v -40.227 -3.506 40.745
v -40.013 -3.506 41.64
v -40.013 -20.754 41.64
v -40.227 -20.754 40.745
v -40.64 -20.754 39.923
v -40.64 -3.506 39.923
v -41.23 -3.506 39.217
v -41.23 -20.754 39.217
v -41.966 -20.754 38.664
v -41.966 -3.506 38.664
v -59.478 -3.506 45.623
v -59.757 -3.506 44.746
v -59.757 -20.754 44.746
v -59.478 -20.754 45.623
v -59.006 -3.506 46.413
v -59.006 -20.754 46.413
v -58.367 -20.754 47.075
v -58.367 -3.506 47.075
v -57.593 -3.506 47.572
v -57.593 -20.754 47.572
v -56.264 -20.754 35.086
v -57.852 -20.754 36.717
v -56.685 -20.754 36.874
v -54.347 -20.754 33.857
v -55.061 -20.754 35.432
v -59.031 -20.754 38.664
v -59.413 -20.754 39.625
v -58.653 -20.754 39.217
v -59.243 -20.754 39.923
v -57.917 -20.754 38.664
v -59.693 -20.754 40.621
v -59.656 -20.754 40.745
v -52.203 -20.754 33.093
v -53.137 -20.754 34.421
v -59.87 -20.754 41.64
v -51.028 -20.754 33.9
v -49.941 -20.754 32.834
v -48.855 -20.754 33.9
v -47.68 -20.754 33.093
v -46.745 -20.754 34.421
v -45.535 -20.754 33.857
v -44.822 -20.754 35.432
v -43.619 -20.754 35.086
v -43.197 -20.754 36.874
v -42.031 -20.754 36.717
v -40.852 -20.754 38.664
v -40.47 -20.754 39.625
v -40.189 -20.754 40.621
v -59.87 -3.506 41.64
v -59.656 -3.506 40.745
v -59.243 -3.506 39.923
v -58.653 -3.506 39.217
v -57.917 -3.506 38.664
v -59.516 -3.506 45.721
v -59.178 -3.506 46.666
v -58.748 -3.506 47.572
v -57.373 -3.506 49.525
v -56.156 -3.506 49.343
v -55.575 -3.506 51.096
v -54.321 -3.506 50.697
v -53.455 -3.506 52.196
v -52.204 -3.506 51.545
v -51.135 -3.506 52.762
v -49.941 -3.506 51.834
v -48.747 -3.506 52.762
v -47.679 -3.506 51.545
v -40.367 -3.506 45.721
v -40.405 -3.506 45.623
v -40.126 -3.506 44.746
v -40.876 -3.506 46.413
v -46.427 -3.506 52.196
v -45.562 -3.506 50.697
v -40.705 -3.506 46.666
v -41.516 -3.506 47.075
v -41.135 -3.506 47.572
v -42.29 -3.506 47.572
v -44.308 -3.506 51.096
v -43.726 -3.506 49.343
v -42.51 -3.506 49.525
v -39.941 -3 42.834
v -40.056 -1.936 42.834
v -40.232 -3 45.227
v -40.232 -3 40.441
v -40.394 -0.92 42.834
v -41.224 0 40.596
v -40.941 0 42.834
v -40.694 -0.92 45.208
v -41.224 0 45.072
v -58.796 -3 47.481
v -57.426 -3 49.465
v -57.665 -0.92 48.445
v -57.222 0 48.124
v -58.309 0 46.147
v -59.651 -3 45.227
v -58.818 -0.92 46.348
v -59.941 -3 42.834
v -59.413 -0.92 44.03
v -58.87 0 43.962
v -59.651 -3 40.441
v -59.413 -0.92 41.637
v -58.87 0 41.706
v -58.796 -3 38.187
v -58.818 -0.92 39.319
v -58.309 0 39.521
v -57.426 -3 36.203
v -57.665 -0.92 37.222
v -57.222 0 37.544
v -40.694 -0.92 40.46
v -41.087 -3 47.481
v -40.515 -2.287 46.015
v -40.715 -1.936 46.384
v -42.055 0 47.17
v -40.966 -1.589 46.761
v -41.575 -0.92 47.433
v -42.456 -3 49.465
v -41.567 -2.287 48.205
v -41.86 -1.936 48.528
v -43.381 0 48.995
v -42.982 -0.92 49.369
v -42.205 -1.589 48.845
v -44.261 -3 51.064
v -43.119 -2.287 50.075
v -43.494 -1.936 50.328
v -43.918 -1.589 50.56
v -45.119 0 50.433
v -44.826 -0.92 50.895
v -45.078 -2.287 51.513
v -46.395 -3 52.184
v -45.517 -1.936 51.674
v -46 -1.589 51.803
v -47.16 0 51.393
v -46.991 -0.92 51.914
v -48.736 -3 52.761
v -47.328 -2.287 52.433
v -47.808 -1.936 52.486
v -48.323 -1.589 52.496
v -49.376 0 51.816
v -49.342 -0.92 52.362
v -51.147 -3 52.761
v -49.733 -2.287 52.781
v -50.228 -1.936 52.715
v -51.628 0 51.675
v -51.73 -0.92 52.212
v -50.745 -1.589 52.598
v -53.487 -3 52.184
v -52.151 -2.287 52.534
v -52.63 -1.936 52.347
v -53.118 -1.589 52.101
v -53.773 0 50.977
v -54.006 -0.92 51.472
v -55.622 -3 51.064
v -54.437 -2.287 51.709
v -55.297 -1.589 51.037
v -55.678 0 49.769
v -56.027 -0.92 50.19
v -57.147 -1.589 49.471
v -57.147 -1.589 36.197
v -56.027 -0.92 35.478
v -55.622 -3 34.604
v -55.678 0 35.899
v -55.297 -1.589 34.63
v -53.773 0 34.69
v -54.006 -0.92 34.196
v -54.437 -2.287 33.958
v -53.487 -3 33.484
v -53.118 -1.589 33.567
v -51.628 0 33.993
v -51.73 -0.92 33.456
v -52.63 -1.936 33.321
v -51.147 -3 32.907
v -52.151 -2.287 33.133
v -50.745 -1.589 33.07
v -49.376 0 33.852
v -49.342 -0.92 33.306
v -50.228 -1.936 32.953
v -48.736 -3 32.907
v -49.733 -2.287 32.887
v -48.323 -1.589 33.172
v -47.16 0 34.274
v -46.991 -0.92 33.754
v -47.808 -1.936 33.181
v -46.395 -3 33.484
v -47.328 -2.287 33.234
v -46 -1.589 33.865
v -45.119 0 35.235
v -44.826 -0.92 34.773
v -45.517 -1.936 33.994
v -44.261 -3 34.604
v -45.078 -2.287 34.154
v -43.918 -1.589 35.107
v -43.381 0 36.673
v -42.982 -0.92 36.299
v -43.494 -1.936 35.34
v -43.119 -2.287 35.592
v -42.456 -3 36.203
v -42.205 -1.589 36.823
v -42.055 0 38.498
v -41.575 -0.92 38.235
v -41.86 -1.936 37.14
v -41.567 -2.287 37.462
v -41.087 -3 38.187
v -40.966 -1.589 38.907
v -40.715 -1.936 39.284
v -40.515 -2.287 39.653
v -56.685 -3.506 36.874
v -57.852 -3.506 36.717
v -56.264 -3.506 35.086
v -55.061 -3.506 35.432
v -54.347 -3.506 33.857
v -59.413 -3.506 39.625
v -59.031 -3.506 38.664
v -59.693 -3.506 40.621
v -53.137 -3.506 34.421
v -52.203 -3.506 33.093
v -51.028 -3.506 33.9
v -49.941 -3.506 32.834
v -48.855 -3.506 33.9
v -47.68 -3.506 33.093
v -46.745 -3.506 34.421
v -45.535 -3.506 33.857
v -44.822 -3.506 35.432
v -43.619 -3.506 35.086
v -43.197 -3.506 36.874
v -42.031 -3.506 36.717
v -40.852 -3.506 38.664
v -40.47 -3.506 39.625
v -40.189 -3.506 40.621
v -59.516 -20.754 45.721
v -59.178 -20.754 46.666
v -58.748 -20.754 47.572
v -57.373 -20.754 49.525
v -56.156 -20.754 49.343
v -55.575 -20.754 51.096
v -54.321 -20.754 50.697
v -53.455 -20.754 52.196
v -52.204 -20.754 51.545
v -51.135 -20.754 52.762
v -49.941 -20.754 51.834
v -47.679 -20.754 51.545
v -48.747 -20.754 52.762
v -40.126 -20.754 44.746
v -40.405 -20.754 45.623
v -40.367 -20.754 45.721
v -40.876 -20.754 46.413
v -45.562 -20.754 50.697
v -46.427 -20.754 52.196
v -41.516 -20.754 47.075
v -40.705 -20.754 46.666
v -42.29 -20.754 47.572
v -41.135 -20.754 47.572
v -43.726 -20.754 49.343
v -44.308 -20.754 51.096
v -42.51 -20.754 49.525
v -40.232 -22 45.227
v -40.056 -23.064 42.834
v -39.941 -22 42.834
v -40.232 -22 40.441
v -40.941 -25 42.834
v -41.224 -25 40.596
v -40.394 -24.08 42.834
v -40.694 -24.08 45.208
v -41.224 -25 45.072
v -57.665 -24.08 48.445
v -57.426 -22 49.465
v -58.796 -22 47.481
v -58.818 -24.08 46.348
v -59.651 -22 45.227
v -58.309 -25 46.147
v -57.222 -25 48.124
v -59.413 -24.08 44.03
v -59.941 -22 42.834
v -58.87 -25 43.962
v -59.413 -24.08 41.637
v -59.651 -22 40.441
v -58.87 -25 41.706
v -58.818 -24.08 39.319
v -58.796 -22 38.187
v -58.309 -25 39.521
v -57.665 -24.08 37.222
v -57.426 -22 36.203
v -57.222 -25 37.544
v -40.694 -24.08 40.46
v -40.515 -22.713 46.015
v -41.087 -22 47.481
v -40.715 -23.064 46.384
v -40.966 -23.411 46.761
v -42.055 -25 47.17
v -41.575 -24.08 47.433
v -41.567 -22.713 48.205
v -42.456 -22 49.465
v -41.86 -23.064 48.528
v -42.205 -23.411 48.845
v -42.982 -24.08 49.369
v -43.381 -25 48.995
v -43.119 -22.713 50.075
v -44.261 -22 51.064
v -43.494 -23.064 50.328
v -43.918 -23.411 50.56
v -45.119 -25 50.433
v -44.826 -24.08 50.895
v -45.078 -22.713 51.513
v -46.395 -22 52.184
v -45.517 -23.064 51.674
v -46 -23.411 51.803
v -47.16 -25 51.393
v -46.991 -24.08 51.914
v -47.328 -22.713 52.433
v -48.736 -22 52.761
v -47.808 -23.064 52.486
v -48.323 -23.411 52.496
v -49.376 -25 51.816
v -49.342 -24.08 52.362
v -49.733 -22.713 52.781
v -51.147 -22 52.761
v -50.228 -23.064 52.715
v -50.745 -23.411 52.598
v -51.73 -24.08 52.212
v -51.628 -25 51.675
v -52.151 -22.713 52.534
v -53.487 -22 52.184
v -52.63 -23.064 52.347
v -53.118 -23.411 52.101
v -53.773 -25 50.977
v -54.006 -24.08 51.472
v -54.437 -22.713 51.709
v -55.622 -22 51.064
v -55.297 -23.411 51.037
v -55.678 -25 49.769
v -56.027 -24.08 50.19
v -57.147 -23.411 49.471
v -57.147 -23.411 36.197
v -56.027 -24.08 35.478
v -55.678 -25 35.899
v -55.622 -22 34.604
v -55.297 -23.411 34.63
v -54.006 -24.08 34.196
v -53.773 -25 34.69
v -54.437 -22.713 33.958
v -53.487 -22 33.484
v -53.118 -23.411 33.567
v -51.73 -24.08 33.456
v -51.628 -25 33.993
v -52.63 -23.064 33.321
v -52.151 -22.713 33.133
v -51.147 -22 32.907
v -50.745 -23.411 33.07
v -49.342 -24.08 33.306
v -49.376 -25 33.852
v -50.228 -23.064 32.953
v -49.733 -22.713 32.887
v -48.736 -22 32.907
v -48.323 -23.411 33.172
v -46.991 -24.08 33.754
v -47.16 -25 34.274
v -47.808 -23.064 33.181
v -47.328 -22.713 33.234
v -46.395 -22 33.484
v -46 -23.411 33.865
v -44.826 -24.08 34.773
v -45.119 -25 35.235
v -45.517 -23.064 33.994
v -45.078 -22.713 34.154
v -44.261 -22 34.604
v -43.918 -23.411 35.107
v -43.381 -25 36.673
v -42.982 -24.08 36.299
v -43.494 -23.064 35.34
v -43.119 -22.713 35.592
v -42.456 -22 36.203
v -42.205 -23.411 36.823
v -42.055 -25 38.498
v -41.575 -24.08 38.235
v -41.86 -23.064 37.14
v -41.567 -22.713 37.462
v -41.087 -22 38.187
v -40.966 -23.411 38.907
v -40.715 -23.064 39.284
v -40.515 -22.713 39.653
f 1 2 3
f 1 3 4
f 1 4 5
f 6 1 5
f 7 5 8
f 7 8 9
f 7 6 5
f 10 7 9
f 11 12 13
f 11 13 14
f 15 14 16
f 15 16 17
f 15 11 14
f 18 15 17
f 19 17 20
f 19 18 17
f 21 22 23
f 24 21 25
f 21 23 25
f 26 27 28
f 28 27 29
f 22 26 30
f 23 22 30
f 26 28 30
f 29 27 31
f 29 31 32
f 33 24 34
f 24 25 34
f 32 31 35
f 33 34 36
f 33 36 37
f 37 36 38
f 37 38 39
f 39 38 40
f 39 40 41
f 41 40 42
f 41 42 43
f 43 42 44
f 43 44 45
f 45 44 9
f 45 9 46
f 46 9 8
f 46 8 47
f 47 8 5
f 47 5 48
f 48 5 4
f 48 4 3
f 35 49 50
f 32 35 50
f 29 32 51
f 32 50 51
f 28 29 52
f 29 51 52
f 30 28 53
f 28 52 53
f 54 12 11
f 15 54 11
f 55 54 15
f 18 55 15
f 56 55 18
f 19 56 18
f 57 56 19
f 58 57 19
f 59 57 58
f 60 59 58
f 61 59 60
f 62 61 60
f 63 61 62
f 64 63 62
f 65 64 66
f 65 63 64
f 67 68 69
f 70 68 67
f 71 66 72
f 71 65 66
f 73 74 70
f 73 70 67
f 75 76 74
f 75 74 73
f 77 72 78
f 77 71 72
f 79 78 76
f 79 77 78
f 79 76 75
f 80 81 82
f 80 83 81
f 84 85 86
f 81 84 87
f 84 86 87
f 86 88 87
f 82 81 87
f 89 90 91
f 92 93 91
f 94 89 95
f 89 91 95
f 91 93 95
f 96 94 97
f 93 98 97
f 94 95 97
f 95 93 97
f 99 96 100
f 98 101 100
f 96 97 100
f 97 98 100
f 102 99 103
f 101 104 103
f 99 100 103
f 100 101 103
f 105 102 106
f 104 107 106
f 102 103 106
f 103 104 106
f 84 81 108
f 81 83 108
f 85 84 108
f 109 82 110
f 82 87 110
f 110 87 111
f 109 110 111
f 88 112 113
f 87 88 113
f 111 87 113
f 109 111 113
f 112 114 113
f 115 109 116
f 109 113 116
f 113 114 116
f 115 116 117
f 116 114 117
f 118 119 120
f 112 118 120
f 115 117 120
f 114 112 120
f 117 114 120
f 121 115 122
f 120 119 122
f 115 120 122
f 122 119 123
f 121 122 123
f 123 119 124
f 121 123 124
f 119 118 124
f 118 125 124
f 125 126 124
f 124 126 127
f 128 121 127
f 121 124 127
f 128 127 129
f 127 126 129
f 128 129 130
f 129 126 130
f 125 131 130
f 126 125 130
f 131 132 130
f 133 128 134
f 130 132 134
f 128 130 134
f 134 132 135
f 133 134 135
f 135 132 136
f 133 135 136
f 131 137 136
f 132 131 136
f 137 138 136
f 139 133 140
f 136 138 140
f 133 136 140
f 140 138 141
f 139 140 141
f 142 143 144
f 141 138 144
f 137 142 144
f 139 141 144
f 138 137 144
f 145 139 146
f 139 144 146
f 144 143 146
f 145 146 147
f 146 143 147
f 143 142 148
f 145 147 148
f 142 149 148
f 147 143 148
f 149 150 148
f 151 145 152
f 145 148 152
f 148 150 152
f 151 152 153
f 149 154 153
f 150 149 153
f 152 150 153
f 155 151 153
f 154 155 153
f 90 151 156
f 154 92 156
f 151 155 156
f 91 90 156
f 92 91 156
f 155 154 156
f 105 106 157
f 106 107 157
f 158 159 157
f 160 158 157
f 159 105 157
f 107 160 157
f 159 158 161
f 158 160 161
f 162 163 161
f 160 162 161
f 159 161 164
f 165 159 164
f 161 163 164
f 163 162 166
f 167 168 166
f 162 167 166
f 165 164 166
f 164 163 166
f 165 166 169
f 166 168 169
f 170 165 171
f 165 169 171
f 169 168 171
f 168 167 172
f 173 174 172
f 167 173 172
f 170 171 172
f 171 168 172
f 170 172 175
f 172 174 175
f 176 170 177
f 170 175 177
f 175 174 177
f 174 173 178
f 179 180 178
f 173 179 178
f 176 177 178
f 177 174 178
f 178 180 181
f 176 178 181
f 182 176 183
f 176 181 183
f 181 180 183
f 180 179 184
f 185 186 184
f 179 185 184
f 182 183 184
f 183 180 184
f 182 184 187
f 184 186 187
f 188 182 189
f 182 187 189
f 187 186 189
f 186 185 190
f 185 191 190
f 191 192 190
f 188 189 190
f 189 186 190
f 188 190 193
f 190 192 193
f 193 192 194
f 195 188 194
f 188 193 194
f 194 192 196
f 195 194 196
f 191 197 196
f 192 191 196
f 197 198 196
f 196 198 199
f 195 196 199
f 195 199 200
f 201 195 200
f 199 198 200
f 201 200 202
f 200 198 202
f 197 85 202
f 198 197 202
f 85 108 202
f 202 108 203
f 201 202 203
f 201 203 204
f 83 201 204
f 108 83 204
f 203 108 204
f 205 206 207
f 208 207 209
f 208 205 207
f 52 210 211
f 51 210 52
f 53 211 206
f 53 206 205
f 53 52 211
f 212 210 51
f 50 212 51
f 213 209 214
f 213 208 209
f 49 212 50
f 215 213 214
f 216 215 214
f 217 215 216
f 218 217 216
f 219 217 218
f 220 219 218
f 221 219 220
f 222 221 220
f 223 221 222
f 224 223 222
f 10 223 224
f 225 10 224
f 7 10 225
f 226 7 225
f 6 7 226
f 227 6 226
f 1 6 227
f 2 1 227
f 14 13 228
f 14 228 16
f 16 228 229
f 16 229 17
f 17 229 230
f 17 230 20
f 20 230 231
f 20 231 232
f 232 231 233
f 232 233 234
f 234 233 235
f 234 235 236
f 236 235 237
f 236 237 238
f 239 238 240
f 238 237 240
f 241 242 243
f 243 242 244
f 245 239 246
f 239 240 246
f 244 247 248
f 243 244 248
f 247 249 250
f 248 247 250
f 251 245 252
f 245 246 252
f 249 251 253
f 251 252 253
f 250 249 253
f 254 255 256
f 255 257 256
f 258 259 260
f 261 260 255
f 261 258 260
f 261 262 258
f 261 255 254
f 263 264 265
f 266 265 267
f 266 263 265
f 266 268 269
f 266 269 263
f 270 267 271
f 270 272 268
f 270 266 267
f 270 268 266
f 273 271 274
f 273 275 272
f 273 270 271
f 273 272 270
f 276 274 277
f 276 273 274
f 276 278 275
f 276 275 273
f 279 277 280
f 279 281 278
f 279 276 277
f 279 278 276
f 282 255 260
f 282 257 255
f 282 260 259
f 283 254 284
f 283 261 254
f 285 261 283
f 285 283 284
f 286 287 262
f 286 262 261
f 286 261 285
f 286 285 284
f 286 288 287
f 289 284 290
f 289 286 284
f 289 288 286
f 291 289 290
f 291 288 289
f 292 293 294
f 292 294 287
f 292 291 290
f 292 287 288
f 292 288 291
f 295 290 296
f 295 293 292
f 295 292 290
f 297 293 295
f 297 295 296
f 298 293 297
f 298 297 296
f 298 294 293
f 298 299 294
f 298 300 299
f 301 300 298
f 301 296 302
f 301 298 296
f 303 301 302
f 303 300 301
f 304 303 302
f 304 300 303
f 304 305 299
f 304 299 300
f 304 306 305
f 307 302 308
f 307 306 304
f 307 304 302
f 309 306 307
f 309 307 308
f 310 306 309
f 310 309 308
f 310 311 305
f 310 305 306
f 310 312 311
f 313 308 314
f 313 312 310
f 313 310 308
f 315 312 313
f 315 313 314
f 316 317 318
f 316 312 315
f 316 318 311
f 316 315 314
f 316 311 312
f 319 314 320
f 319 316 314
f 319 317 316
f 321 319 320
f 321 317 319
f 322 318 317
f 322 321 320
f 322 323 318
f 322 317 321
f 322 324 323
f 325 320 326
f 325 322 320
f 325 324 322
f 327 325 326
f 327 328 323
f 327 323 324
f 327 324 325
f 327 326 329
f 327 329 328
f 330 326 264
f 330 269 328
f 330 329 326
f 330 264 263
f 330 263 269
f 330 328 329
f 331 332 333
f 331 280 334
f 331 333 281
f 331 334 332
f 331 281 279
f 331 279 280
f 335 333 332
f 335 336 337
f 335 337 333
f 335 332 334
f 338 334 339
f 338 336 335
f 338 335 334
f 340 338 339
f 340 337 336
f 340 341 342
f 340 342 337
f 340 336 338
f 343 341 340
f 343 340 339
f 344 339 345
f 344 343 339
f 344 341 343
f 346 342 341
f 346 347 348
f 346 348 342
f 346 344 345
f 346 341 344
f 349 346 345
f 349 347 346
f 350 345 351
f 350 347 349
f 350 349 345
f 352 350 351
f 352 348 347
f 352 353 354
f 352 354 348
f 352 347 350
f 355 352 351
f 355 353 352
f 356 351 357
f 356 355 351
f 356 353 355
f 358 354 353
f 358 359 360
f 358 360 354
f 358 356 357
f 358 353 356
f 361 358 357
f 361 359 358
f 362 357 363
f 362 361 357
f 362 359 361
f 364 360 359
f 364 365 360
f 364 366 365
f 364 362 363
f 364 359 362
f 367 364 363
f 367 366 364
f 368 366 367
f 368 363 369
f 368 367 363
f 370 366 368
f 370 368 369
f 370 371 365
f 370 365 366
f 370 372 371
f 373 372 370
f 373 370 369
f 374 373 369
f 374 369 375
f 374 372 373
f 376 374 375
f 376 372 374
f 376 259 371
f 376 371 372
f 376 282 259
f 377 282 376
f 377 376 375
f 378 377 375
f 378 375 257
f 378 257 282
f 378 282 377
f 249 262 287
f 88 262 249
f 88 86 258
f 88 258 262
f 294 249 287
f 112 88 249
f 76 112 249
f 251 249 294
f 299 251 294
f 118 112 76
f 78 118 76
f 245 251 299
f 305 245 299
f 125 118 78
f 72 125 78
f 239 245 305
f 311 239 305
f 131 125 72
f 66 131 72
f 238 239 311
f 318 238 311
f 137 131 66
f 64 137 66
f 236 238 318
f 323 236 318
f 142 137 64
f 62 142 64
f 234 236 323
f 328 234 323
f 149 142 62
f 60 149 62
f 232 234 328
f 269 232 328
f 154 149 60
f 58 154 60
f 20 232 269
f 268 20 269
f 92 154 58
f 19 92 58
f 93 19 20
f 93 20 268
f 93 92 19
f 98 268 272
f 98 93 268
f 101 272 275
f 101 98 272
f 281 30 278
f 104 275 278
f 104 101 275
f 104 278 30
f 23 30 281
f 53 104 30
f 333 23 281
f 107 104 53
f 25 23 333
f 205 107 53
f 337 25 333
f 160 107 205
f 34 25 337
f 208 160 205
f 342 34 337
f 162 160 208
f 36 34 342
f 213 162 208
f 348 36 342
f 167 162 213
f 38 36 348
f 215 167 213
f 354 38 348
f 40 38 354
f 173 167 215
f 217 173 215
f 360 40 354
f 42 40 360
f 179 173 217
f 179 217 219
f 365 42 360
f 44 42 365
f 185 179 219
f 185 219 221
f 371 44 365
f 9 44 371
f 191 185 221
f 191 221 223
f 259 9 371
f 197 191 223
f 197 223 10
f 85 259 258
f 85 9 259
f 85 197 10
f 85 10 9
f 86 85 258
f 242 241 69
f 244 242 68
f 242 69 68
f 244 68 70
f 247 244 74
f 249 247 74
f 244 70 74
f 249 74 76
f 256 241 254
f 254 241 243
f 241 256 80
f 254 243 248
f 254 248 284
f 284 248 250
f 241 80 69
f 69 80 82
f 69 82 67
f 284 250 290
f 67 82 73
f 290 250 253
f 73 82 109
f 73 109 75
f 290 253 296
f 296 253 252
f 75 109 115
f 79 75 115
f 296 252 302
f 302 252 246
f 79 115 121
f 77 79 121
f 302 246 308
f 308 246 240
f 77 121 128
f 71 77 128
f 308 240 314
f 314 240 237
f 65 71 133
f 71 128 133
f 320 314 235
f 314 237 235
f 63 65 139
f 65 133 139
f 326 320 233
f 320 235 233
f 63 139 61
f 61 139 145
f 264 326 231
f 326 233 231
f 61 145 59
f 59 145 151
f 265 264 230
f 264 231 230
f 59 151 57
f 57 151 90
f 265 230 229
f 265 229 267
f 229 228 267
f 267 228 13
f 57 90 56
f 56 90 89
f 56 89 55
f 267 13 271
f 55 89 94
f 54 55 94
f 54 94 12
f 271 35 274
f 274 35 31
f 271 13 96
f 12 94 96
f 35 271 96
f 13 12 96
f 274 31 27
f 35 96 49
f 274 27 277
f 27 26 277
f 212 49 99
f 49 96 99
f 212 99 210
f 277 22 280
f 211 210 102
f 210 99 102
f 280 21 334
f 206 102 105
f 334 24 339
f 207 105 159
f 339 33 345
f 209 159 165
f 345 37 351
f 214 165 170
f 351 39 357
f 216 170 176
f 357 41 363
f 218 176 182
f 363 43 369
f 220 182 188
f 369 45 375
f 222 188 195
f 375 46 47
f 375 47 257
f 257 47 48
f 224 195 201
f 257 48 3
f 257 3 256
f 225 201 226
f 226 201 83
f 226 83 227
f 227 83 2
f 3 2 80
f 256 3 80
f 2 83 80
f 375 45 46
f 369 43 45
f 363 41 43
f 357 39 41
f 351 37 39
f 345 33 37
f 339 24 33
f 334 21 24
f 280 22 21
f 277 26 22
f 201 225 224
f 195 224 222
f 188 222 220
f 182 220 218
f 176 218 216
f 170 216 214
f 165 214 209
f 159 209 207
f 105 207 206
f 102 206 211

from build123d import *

# Parameters (mm, degrees)
F0_R        = 10
F0_R_2      = 9
F1_DEPTH    = 25
F2_W        = 17.247292446
F2_H        = 6.4440444112
F2_H_2      = 8.7184142321
F3_DEPTH    = 200
F5_T1_DEPTH = 17.247292446


# Not quite as in the source:
# - a fillet or chamfer that OpenCascade refuses, or shapes differently, is made with other operations: its cross-section is extruded or revolved along the edge and cut away or added


with BuildPart() as f1:
    # F0 (on Front) → F1 (new body)
    with BuildSketch(Plane.XZ):
        with Locations((-49.9413348734, 42.8339354694)):
            Circle(F0_R)
        with Locations((-49.9413348734, 42.8339354694)):
            Circle(F0_R_2, mode=Mode.SUBTRACT)
    extrude(amount=F1_DEPTH)

    # F2 (on Right) → F3 (cut)
    with BuildSketch(Plane.YZ):
        with Locations((-12.1299646562, 50.7942251861)):
            Rectangle(F2_W, F2_H)
        with Locations((-12.1299646562, 34.3050556257)):
            Rectangle(F2_W, F2_H_2)
    extrude(amount=-F3_DEPTH, mode=Mode.SUBTRACT)

    # F4: fillet of radius 5 on 2 edges, made by hand

    # F4_s1 → F4_t2 (revolve, cut)
    with BuildSketch(Plane.XY.offset(42.8339354694)):
        with BuildLine():
            ThreePointArc((-39.9413348734, -22), (-40.1979183832, -23.5811388301), (-40.9413348734, -25))
            Line((-40.9413348734, -25), (-39.9413348734, -25))
            Line((-39.9413348734, -25), (-39.9413348734, -22))
        make_face()
    revolve(axis=Axis((-49.9413348734, -25, 42.8339354694), (0, -1, 0)), mode=Mode.SUBTRACT)

    # F4_s3 → F4_t4 (revolve, cut)
    with BuildSketch(Plane.XY.offset(42.8339354694)):
        with BuildLine():
            ThreePointArc((-39.9413348734, -3), (-40.1979183832, -1.4188611699), (-40.9413348734, 0))
            Line((-40.9413348734, 0), (-39.9413348734, 0))
            Line((-39.9413348734, 0), (-39.9413348734, -3))
        make_face()
    revolve(axis=Axis((-49.9413348734, 0, 42.8339354694), (0, -1, 0)), mode=Mode.SUBTRACT)

    # F5: fillet of radius 4 on 4 edges, made by hand

    # F5_s2 → F5_t1 (cut)
    with BuildSketch(Plane.XZ.offset(3.5063184332)):
        with BuildLine():
            ThreePointArc((-59.7567525129, 44.7464146362), (-59.0064973809, 46.4132090316), (-57.5930550064, 47.5722029805))
            Line((-57.5930550064, 47.5722029805), (-58.7475157138, 47.5722029805))
            ThreePointArc((-58.7475157138, 47.5722029805), (-59.3587258299, 46.1973782848), (-59.7567525129, 44.7464146362))
        make_face()
        with BuildLine():
            ThreePointArc((-40.125917234, 44.7464146362), (-40.876172366, 46.4132090316), (-42.2896147405, 47.5722029805))
            Line((-42.2896147405, 47.5722029805), (-41.1351540331, 47.5722029805))
            ThreePointArc((-41.1351540331, 47.5722029805), (-40.5239439169, 46.1973782848), (-40.125917234, 44.7464146362))
        make_face()
        with BuildLine():
            ThreePointArc((-40.0128864724, 41.6398197512), (-40.6400284609, 39.9229099557), (-41.9655070578, 38.6642627418))
            Line((-41.9655070578, 38.6642627418), (-40.8521198719, 38.6642627418))
            ThreePointArc((-40.8521198719, 38.6642627418), (-40.3168159139, 40.1194125284), (-40.0128864724, 41.6398197512))
        make_face()
        with BuildLine():
            ThreePointArc((-59.8697832745, 41.6398197512), (-59.2426412859, 39.9229099557), (-57.9171626891, 38.6642627418))
            Line((-57.9171626891, 38.6642627418), (-59.030549875, 38.6642627418))
            ThreePointArc((-59.030549875, 38.6642627418), (-59.565853833, 40.1194125284), (-59.8697832745, 41.6398197512))
        make_face()
    extrude(amount=F5_T1_DEPTH, mode=Mode.SUBTRACT)


solid = f1.part
